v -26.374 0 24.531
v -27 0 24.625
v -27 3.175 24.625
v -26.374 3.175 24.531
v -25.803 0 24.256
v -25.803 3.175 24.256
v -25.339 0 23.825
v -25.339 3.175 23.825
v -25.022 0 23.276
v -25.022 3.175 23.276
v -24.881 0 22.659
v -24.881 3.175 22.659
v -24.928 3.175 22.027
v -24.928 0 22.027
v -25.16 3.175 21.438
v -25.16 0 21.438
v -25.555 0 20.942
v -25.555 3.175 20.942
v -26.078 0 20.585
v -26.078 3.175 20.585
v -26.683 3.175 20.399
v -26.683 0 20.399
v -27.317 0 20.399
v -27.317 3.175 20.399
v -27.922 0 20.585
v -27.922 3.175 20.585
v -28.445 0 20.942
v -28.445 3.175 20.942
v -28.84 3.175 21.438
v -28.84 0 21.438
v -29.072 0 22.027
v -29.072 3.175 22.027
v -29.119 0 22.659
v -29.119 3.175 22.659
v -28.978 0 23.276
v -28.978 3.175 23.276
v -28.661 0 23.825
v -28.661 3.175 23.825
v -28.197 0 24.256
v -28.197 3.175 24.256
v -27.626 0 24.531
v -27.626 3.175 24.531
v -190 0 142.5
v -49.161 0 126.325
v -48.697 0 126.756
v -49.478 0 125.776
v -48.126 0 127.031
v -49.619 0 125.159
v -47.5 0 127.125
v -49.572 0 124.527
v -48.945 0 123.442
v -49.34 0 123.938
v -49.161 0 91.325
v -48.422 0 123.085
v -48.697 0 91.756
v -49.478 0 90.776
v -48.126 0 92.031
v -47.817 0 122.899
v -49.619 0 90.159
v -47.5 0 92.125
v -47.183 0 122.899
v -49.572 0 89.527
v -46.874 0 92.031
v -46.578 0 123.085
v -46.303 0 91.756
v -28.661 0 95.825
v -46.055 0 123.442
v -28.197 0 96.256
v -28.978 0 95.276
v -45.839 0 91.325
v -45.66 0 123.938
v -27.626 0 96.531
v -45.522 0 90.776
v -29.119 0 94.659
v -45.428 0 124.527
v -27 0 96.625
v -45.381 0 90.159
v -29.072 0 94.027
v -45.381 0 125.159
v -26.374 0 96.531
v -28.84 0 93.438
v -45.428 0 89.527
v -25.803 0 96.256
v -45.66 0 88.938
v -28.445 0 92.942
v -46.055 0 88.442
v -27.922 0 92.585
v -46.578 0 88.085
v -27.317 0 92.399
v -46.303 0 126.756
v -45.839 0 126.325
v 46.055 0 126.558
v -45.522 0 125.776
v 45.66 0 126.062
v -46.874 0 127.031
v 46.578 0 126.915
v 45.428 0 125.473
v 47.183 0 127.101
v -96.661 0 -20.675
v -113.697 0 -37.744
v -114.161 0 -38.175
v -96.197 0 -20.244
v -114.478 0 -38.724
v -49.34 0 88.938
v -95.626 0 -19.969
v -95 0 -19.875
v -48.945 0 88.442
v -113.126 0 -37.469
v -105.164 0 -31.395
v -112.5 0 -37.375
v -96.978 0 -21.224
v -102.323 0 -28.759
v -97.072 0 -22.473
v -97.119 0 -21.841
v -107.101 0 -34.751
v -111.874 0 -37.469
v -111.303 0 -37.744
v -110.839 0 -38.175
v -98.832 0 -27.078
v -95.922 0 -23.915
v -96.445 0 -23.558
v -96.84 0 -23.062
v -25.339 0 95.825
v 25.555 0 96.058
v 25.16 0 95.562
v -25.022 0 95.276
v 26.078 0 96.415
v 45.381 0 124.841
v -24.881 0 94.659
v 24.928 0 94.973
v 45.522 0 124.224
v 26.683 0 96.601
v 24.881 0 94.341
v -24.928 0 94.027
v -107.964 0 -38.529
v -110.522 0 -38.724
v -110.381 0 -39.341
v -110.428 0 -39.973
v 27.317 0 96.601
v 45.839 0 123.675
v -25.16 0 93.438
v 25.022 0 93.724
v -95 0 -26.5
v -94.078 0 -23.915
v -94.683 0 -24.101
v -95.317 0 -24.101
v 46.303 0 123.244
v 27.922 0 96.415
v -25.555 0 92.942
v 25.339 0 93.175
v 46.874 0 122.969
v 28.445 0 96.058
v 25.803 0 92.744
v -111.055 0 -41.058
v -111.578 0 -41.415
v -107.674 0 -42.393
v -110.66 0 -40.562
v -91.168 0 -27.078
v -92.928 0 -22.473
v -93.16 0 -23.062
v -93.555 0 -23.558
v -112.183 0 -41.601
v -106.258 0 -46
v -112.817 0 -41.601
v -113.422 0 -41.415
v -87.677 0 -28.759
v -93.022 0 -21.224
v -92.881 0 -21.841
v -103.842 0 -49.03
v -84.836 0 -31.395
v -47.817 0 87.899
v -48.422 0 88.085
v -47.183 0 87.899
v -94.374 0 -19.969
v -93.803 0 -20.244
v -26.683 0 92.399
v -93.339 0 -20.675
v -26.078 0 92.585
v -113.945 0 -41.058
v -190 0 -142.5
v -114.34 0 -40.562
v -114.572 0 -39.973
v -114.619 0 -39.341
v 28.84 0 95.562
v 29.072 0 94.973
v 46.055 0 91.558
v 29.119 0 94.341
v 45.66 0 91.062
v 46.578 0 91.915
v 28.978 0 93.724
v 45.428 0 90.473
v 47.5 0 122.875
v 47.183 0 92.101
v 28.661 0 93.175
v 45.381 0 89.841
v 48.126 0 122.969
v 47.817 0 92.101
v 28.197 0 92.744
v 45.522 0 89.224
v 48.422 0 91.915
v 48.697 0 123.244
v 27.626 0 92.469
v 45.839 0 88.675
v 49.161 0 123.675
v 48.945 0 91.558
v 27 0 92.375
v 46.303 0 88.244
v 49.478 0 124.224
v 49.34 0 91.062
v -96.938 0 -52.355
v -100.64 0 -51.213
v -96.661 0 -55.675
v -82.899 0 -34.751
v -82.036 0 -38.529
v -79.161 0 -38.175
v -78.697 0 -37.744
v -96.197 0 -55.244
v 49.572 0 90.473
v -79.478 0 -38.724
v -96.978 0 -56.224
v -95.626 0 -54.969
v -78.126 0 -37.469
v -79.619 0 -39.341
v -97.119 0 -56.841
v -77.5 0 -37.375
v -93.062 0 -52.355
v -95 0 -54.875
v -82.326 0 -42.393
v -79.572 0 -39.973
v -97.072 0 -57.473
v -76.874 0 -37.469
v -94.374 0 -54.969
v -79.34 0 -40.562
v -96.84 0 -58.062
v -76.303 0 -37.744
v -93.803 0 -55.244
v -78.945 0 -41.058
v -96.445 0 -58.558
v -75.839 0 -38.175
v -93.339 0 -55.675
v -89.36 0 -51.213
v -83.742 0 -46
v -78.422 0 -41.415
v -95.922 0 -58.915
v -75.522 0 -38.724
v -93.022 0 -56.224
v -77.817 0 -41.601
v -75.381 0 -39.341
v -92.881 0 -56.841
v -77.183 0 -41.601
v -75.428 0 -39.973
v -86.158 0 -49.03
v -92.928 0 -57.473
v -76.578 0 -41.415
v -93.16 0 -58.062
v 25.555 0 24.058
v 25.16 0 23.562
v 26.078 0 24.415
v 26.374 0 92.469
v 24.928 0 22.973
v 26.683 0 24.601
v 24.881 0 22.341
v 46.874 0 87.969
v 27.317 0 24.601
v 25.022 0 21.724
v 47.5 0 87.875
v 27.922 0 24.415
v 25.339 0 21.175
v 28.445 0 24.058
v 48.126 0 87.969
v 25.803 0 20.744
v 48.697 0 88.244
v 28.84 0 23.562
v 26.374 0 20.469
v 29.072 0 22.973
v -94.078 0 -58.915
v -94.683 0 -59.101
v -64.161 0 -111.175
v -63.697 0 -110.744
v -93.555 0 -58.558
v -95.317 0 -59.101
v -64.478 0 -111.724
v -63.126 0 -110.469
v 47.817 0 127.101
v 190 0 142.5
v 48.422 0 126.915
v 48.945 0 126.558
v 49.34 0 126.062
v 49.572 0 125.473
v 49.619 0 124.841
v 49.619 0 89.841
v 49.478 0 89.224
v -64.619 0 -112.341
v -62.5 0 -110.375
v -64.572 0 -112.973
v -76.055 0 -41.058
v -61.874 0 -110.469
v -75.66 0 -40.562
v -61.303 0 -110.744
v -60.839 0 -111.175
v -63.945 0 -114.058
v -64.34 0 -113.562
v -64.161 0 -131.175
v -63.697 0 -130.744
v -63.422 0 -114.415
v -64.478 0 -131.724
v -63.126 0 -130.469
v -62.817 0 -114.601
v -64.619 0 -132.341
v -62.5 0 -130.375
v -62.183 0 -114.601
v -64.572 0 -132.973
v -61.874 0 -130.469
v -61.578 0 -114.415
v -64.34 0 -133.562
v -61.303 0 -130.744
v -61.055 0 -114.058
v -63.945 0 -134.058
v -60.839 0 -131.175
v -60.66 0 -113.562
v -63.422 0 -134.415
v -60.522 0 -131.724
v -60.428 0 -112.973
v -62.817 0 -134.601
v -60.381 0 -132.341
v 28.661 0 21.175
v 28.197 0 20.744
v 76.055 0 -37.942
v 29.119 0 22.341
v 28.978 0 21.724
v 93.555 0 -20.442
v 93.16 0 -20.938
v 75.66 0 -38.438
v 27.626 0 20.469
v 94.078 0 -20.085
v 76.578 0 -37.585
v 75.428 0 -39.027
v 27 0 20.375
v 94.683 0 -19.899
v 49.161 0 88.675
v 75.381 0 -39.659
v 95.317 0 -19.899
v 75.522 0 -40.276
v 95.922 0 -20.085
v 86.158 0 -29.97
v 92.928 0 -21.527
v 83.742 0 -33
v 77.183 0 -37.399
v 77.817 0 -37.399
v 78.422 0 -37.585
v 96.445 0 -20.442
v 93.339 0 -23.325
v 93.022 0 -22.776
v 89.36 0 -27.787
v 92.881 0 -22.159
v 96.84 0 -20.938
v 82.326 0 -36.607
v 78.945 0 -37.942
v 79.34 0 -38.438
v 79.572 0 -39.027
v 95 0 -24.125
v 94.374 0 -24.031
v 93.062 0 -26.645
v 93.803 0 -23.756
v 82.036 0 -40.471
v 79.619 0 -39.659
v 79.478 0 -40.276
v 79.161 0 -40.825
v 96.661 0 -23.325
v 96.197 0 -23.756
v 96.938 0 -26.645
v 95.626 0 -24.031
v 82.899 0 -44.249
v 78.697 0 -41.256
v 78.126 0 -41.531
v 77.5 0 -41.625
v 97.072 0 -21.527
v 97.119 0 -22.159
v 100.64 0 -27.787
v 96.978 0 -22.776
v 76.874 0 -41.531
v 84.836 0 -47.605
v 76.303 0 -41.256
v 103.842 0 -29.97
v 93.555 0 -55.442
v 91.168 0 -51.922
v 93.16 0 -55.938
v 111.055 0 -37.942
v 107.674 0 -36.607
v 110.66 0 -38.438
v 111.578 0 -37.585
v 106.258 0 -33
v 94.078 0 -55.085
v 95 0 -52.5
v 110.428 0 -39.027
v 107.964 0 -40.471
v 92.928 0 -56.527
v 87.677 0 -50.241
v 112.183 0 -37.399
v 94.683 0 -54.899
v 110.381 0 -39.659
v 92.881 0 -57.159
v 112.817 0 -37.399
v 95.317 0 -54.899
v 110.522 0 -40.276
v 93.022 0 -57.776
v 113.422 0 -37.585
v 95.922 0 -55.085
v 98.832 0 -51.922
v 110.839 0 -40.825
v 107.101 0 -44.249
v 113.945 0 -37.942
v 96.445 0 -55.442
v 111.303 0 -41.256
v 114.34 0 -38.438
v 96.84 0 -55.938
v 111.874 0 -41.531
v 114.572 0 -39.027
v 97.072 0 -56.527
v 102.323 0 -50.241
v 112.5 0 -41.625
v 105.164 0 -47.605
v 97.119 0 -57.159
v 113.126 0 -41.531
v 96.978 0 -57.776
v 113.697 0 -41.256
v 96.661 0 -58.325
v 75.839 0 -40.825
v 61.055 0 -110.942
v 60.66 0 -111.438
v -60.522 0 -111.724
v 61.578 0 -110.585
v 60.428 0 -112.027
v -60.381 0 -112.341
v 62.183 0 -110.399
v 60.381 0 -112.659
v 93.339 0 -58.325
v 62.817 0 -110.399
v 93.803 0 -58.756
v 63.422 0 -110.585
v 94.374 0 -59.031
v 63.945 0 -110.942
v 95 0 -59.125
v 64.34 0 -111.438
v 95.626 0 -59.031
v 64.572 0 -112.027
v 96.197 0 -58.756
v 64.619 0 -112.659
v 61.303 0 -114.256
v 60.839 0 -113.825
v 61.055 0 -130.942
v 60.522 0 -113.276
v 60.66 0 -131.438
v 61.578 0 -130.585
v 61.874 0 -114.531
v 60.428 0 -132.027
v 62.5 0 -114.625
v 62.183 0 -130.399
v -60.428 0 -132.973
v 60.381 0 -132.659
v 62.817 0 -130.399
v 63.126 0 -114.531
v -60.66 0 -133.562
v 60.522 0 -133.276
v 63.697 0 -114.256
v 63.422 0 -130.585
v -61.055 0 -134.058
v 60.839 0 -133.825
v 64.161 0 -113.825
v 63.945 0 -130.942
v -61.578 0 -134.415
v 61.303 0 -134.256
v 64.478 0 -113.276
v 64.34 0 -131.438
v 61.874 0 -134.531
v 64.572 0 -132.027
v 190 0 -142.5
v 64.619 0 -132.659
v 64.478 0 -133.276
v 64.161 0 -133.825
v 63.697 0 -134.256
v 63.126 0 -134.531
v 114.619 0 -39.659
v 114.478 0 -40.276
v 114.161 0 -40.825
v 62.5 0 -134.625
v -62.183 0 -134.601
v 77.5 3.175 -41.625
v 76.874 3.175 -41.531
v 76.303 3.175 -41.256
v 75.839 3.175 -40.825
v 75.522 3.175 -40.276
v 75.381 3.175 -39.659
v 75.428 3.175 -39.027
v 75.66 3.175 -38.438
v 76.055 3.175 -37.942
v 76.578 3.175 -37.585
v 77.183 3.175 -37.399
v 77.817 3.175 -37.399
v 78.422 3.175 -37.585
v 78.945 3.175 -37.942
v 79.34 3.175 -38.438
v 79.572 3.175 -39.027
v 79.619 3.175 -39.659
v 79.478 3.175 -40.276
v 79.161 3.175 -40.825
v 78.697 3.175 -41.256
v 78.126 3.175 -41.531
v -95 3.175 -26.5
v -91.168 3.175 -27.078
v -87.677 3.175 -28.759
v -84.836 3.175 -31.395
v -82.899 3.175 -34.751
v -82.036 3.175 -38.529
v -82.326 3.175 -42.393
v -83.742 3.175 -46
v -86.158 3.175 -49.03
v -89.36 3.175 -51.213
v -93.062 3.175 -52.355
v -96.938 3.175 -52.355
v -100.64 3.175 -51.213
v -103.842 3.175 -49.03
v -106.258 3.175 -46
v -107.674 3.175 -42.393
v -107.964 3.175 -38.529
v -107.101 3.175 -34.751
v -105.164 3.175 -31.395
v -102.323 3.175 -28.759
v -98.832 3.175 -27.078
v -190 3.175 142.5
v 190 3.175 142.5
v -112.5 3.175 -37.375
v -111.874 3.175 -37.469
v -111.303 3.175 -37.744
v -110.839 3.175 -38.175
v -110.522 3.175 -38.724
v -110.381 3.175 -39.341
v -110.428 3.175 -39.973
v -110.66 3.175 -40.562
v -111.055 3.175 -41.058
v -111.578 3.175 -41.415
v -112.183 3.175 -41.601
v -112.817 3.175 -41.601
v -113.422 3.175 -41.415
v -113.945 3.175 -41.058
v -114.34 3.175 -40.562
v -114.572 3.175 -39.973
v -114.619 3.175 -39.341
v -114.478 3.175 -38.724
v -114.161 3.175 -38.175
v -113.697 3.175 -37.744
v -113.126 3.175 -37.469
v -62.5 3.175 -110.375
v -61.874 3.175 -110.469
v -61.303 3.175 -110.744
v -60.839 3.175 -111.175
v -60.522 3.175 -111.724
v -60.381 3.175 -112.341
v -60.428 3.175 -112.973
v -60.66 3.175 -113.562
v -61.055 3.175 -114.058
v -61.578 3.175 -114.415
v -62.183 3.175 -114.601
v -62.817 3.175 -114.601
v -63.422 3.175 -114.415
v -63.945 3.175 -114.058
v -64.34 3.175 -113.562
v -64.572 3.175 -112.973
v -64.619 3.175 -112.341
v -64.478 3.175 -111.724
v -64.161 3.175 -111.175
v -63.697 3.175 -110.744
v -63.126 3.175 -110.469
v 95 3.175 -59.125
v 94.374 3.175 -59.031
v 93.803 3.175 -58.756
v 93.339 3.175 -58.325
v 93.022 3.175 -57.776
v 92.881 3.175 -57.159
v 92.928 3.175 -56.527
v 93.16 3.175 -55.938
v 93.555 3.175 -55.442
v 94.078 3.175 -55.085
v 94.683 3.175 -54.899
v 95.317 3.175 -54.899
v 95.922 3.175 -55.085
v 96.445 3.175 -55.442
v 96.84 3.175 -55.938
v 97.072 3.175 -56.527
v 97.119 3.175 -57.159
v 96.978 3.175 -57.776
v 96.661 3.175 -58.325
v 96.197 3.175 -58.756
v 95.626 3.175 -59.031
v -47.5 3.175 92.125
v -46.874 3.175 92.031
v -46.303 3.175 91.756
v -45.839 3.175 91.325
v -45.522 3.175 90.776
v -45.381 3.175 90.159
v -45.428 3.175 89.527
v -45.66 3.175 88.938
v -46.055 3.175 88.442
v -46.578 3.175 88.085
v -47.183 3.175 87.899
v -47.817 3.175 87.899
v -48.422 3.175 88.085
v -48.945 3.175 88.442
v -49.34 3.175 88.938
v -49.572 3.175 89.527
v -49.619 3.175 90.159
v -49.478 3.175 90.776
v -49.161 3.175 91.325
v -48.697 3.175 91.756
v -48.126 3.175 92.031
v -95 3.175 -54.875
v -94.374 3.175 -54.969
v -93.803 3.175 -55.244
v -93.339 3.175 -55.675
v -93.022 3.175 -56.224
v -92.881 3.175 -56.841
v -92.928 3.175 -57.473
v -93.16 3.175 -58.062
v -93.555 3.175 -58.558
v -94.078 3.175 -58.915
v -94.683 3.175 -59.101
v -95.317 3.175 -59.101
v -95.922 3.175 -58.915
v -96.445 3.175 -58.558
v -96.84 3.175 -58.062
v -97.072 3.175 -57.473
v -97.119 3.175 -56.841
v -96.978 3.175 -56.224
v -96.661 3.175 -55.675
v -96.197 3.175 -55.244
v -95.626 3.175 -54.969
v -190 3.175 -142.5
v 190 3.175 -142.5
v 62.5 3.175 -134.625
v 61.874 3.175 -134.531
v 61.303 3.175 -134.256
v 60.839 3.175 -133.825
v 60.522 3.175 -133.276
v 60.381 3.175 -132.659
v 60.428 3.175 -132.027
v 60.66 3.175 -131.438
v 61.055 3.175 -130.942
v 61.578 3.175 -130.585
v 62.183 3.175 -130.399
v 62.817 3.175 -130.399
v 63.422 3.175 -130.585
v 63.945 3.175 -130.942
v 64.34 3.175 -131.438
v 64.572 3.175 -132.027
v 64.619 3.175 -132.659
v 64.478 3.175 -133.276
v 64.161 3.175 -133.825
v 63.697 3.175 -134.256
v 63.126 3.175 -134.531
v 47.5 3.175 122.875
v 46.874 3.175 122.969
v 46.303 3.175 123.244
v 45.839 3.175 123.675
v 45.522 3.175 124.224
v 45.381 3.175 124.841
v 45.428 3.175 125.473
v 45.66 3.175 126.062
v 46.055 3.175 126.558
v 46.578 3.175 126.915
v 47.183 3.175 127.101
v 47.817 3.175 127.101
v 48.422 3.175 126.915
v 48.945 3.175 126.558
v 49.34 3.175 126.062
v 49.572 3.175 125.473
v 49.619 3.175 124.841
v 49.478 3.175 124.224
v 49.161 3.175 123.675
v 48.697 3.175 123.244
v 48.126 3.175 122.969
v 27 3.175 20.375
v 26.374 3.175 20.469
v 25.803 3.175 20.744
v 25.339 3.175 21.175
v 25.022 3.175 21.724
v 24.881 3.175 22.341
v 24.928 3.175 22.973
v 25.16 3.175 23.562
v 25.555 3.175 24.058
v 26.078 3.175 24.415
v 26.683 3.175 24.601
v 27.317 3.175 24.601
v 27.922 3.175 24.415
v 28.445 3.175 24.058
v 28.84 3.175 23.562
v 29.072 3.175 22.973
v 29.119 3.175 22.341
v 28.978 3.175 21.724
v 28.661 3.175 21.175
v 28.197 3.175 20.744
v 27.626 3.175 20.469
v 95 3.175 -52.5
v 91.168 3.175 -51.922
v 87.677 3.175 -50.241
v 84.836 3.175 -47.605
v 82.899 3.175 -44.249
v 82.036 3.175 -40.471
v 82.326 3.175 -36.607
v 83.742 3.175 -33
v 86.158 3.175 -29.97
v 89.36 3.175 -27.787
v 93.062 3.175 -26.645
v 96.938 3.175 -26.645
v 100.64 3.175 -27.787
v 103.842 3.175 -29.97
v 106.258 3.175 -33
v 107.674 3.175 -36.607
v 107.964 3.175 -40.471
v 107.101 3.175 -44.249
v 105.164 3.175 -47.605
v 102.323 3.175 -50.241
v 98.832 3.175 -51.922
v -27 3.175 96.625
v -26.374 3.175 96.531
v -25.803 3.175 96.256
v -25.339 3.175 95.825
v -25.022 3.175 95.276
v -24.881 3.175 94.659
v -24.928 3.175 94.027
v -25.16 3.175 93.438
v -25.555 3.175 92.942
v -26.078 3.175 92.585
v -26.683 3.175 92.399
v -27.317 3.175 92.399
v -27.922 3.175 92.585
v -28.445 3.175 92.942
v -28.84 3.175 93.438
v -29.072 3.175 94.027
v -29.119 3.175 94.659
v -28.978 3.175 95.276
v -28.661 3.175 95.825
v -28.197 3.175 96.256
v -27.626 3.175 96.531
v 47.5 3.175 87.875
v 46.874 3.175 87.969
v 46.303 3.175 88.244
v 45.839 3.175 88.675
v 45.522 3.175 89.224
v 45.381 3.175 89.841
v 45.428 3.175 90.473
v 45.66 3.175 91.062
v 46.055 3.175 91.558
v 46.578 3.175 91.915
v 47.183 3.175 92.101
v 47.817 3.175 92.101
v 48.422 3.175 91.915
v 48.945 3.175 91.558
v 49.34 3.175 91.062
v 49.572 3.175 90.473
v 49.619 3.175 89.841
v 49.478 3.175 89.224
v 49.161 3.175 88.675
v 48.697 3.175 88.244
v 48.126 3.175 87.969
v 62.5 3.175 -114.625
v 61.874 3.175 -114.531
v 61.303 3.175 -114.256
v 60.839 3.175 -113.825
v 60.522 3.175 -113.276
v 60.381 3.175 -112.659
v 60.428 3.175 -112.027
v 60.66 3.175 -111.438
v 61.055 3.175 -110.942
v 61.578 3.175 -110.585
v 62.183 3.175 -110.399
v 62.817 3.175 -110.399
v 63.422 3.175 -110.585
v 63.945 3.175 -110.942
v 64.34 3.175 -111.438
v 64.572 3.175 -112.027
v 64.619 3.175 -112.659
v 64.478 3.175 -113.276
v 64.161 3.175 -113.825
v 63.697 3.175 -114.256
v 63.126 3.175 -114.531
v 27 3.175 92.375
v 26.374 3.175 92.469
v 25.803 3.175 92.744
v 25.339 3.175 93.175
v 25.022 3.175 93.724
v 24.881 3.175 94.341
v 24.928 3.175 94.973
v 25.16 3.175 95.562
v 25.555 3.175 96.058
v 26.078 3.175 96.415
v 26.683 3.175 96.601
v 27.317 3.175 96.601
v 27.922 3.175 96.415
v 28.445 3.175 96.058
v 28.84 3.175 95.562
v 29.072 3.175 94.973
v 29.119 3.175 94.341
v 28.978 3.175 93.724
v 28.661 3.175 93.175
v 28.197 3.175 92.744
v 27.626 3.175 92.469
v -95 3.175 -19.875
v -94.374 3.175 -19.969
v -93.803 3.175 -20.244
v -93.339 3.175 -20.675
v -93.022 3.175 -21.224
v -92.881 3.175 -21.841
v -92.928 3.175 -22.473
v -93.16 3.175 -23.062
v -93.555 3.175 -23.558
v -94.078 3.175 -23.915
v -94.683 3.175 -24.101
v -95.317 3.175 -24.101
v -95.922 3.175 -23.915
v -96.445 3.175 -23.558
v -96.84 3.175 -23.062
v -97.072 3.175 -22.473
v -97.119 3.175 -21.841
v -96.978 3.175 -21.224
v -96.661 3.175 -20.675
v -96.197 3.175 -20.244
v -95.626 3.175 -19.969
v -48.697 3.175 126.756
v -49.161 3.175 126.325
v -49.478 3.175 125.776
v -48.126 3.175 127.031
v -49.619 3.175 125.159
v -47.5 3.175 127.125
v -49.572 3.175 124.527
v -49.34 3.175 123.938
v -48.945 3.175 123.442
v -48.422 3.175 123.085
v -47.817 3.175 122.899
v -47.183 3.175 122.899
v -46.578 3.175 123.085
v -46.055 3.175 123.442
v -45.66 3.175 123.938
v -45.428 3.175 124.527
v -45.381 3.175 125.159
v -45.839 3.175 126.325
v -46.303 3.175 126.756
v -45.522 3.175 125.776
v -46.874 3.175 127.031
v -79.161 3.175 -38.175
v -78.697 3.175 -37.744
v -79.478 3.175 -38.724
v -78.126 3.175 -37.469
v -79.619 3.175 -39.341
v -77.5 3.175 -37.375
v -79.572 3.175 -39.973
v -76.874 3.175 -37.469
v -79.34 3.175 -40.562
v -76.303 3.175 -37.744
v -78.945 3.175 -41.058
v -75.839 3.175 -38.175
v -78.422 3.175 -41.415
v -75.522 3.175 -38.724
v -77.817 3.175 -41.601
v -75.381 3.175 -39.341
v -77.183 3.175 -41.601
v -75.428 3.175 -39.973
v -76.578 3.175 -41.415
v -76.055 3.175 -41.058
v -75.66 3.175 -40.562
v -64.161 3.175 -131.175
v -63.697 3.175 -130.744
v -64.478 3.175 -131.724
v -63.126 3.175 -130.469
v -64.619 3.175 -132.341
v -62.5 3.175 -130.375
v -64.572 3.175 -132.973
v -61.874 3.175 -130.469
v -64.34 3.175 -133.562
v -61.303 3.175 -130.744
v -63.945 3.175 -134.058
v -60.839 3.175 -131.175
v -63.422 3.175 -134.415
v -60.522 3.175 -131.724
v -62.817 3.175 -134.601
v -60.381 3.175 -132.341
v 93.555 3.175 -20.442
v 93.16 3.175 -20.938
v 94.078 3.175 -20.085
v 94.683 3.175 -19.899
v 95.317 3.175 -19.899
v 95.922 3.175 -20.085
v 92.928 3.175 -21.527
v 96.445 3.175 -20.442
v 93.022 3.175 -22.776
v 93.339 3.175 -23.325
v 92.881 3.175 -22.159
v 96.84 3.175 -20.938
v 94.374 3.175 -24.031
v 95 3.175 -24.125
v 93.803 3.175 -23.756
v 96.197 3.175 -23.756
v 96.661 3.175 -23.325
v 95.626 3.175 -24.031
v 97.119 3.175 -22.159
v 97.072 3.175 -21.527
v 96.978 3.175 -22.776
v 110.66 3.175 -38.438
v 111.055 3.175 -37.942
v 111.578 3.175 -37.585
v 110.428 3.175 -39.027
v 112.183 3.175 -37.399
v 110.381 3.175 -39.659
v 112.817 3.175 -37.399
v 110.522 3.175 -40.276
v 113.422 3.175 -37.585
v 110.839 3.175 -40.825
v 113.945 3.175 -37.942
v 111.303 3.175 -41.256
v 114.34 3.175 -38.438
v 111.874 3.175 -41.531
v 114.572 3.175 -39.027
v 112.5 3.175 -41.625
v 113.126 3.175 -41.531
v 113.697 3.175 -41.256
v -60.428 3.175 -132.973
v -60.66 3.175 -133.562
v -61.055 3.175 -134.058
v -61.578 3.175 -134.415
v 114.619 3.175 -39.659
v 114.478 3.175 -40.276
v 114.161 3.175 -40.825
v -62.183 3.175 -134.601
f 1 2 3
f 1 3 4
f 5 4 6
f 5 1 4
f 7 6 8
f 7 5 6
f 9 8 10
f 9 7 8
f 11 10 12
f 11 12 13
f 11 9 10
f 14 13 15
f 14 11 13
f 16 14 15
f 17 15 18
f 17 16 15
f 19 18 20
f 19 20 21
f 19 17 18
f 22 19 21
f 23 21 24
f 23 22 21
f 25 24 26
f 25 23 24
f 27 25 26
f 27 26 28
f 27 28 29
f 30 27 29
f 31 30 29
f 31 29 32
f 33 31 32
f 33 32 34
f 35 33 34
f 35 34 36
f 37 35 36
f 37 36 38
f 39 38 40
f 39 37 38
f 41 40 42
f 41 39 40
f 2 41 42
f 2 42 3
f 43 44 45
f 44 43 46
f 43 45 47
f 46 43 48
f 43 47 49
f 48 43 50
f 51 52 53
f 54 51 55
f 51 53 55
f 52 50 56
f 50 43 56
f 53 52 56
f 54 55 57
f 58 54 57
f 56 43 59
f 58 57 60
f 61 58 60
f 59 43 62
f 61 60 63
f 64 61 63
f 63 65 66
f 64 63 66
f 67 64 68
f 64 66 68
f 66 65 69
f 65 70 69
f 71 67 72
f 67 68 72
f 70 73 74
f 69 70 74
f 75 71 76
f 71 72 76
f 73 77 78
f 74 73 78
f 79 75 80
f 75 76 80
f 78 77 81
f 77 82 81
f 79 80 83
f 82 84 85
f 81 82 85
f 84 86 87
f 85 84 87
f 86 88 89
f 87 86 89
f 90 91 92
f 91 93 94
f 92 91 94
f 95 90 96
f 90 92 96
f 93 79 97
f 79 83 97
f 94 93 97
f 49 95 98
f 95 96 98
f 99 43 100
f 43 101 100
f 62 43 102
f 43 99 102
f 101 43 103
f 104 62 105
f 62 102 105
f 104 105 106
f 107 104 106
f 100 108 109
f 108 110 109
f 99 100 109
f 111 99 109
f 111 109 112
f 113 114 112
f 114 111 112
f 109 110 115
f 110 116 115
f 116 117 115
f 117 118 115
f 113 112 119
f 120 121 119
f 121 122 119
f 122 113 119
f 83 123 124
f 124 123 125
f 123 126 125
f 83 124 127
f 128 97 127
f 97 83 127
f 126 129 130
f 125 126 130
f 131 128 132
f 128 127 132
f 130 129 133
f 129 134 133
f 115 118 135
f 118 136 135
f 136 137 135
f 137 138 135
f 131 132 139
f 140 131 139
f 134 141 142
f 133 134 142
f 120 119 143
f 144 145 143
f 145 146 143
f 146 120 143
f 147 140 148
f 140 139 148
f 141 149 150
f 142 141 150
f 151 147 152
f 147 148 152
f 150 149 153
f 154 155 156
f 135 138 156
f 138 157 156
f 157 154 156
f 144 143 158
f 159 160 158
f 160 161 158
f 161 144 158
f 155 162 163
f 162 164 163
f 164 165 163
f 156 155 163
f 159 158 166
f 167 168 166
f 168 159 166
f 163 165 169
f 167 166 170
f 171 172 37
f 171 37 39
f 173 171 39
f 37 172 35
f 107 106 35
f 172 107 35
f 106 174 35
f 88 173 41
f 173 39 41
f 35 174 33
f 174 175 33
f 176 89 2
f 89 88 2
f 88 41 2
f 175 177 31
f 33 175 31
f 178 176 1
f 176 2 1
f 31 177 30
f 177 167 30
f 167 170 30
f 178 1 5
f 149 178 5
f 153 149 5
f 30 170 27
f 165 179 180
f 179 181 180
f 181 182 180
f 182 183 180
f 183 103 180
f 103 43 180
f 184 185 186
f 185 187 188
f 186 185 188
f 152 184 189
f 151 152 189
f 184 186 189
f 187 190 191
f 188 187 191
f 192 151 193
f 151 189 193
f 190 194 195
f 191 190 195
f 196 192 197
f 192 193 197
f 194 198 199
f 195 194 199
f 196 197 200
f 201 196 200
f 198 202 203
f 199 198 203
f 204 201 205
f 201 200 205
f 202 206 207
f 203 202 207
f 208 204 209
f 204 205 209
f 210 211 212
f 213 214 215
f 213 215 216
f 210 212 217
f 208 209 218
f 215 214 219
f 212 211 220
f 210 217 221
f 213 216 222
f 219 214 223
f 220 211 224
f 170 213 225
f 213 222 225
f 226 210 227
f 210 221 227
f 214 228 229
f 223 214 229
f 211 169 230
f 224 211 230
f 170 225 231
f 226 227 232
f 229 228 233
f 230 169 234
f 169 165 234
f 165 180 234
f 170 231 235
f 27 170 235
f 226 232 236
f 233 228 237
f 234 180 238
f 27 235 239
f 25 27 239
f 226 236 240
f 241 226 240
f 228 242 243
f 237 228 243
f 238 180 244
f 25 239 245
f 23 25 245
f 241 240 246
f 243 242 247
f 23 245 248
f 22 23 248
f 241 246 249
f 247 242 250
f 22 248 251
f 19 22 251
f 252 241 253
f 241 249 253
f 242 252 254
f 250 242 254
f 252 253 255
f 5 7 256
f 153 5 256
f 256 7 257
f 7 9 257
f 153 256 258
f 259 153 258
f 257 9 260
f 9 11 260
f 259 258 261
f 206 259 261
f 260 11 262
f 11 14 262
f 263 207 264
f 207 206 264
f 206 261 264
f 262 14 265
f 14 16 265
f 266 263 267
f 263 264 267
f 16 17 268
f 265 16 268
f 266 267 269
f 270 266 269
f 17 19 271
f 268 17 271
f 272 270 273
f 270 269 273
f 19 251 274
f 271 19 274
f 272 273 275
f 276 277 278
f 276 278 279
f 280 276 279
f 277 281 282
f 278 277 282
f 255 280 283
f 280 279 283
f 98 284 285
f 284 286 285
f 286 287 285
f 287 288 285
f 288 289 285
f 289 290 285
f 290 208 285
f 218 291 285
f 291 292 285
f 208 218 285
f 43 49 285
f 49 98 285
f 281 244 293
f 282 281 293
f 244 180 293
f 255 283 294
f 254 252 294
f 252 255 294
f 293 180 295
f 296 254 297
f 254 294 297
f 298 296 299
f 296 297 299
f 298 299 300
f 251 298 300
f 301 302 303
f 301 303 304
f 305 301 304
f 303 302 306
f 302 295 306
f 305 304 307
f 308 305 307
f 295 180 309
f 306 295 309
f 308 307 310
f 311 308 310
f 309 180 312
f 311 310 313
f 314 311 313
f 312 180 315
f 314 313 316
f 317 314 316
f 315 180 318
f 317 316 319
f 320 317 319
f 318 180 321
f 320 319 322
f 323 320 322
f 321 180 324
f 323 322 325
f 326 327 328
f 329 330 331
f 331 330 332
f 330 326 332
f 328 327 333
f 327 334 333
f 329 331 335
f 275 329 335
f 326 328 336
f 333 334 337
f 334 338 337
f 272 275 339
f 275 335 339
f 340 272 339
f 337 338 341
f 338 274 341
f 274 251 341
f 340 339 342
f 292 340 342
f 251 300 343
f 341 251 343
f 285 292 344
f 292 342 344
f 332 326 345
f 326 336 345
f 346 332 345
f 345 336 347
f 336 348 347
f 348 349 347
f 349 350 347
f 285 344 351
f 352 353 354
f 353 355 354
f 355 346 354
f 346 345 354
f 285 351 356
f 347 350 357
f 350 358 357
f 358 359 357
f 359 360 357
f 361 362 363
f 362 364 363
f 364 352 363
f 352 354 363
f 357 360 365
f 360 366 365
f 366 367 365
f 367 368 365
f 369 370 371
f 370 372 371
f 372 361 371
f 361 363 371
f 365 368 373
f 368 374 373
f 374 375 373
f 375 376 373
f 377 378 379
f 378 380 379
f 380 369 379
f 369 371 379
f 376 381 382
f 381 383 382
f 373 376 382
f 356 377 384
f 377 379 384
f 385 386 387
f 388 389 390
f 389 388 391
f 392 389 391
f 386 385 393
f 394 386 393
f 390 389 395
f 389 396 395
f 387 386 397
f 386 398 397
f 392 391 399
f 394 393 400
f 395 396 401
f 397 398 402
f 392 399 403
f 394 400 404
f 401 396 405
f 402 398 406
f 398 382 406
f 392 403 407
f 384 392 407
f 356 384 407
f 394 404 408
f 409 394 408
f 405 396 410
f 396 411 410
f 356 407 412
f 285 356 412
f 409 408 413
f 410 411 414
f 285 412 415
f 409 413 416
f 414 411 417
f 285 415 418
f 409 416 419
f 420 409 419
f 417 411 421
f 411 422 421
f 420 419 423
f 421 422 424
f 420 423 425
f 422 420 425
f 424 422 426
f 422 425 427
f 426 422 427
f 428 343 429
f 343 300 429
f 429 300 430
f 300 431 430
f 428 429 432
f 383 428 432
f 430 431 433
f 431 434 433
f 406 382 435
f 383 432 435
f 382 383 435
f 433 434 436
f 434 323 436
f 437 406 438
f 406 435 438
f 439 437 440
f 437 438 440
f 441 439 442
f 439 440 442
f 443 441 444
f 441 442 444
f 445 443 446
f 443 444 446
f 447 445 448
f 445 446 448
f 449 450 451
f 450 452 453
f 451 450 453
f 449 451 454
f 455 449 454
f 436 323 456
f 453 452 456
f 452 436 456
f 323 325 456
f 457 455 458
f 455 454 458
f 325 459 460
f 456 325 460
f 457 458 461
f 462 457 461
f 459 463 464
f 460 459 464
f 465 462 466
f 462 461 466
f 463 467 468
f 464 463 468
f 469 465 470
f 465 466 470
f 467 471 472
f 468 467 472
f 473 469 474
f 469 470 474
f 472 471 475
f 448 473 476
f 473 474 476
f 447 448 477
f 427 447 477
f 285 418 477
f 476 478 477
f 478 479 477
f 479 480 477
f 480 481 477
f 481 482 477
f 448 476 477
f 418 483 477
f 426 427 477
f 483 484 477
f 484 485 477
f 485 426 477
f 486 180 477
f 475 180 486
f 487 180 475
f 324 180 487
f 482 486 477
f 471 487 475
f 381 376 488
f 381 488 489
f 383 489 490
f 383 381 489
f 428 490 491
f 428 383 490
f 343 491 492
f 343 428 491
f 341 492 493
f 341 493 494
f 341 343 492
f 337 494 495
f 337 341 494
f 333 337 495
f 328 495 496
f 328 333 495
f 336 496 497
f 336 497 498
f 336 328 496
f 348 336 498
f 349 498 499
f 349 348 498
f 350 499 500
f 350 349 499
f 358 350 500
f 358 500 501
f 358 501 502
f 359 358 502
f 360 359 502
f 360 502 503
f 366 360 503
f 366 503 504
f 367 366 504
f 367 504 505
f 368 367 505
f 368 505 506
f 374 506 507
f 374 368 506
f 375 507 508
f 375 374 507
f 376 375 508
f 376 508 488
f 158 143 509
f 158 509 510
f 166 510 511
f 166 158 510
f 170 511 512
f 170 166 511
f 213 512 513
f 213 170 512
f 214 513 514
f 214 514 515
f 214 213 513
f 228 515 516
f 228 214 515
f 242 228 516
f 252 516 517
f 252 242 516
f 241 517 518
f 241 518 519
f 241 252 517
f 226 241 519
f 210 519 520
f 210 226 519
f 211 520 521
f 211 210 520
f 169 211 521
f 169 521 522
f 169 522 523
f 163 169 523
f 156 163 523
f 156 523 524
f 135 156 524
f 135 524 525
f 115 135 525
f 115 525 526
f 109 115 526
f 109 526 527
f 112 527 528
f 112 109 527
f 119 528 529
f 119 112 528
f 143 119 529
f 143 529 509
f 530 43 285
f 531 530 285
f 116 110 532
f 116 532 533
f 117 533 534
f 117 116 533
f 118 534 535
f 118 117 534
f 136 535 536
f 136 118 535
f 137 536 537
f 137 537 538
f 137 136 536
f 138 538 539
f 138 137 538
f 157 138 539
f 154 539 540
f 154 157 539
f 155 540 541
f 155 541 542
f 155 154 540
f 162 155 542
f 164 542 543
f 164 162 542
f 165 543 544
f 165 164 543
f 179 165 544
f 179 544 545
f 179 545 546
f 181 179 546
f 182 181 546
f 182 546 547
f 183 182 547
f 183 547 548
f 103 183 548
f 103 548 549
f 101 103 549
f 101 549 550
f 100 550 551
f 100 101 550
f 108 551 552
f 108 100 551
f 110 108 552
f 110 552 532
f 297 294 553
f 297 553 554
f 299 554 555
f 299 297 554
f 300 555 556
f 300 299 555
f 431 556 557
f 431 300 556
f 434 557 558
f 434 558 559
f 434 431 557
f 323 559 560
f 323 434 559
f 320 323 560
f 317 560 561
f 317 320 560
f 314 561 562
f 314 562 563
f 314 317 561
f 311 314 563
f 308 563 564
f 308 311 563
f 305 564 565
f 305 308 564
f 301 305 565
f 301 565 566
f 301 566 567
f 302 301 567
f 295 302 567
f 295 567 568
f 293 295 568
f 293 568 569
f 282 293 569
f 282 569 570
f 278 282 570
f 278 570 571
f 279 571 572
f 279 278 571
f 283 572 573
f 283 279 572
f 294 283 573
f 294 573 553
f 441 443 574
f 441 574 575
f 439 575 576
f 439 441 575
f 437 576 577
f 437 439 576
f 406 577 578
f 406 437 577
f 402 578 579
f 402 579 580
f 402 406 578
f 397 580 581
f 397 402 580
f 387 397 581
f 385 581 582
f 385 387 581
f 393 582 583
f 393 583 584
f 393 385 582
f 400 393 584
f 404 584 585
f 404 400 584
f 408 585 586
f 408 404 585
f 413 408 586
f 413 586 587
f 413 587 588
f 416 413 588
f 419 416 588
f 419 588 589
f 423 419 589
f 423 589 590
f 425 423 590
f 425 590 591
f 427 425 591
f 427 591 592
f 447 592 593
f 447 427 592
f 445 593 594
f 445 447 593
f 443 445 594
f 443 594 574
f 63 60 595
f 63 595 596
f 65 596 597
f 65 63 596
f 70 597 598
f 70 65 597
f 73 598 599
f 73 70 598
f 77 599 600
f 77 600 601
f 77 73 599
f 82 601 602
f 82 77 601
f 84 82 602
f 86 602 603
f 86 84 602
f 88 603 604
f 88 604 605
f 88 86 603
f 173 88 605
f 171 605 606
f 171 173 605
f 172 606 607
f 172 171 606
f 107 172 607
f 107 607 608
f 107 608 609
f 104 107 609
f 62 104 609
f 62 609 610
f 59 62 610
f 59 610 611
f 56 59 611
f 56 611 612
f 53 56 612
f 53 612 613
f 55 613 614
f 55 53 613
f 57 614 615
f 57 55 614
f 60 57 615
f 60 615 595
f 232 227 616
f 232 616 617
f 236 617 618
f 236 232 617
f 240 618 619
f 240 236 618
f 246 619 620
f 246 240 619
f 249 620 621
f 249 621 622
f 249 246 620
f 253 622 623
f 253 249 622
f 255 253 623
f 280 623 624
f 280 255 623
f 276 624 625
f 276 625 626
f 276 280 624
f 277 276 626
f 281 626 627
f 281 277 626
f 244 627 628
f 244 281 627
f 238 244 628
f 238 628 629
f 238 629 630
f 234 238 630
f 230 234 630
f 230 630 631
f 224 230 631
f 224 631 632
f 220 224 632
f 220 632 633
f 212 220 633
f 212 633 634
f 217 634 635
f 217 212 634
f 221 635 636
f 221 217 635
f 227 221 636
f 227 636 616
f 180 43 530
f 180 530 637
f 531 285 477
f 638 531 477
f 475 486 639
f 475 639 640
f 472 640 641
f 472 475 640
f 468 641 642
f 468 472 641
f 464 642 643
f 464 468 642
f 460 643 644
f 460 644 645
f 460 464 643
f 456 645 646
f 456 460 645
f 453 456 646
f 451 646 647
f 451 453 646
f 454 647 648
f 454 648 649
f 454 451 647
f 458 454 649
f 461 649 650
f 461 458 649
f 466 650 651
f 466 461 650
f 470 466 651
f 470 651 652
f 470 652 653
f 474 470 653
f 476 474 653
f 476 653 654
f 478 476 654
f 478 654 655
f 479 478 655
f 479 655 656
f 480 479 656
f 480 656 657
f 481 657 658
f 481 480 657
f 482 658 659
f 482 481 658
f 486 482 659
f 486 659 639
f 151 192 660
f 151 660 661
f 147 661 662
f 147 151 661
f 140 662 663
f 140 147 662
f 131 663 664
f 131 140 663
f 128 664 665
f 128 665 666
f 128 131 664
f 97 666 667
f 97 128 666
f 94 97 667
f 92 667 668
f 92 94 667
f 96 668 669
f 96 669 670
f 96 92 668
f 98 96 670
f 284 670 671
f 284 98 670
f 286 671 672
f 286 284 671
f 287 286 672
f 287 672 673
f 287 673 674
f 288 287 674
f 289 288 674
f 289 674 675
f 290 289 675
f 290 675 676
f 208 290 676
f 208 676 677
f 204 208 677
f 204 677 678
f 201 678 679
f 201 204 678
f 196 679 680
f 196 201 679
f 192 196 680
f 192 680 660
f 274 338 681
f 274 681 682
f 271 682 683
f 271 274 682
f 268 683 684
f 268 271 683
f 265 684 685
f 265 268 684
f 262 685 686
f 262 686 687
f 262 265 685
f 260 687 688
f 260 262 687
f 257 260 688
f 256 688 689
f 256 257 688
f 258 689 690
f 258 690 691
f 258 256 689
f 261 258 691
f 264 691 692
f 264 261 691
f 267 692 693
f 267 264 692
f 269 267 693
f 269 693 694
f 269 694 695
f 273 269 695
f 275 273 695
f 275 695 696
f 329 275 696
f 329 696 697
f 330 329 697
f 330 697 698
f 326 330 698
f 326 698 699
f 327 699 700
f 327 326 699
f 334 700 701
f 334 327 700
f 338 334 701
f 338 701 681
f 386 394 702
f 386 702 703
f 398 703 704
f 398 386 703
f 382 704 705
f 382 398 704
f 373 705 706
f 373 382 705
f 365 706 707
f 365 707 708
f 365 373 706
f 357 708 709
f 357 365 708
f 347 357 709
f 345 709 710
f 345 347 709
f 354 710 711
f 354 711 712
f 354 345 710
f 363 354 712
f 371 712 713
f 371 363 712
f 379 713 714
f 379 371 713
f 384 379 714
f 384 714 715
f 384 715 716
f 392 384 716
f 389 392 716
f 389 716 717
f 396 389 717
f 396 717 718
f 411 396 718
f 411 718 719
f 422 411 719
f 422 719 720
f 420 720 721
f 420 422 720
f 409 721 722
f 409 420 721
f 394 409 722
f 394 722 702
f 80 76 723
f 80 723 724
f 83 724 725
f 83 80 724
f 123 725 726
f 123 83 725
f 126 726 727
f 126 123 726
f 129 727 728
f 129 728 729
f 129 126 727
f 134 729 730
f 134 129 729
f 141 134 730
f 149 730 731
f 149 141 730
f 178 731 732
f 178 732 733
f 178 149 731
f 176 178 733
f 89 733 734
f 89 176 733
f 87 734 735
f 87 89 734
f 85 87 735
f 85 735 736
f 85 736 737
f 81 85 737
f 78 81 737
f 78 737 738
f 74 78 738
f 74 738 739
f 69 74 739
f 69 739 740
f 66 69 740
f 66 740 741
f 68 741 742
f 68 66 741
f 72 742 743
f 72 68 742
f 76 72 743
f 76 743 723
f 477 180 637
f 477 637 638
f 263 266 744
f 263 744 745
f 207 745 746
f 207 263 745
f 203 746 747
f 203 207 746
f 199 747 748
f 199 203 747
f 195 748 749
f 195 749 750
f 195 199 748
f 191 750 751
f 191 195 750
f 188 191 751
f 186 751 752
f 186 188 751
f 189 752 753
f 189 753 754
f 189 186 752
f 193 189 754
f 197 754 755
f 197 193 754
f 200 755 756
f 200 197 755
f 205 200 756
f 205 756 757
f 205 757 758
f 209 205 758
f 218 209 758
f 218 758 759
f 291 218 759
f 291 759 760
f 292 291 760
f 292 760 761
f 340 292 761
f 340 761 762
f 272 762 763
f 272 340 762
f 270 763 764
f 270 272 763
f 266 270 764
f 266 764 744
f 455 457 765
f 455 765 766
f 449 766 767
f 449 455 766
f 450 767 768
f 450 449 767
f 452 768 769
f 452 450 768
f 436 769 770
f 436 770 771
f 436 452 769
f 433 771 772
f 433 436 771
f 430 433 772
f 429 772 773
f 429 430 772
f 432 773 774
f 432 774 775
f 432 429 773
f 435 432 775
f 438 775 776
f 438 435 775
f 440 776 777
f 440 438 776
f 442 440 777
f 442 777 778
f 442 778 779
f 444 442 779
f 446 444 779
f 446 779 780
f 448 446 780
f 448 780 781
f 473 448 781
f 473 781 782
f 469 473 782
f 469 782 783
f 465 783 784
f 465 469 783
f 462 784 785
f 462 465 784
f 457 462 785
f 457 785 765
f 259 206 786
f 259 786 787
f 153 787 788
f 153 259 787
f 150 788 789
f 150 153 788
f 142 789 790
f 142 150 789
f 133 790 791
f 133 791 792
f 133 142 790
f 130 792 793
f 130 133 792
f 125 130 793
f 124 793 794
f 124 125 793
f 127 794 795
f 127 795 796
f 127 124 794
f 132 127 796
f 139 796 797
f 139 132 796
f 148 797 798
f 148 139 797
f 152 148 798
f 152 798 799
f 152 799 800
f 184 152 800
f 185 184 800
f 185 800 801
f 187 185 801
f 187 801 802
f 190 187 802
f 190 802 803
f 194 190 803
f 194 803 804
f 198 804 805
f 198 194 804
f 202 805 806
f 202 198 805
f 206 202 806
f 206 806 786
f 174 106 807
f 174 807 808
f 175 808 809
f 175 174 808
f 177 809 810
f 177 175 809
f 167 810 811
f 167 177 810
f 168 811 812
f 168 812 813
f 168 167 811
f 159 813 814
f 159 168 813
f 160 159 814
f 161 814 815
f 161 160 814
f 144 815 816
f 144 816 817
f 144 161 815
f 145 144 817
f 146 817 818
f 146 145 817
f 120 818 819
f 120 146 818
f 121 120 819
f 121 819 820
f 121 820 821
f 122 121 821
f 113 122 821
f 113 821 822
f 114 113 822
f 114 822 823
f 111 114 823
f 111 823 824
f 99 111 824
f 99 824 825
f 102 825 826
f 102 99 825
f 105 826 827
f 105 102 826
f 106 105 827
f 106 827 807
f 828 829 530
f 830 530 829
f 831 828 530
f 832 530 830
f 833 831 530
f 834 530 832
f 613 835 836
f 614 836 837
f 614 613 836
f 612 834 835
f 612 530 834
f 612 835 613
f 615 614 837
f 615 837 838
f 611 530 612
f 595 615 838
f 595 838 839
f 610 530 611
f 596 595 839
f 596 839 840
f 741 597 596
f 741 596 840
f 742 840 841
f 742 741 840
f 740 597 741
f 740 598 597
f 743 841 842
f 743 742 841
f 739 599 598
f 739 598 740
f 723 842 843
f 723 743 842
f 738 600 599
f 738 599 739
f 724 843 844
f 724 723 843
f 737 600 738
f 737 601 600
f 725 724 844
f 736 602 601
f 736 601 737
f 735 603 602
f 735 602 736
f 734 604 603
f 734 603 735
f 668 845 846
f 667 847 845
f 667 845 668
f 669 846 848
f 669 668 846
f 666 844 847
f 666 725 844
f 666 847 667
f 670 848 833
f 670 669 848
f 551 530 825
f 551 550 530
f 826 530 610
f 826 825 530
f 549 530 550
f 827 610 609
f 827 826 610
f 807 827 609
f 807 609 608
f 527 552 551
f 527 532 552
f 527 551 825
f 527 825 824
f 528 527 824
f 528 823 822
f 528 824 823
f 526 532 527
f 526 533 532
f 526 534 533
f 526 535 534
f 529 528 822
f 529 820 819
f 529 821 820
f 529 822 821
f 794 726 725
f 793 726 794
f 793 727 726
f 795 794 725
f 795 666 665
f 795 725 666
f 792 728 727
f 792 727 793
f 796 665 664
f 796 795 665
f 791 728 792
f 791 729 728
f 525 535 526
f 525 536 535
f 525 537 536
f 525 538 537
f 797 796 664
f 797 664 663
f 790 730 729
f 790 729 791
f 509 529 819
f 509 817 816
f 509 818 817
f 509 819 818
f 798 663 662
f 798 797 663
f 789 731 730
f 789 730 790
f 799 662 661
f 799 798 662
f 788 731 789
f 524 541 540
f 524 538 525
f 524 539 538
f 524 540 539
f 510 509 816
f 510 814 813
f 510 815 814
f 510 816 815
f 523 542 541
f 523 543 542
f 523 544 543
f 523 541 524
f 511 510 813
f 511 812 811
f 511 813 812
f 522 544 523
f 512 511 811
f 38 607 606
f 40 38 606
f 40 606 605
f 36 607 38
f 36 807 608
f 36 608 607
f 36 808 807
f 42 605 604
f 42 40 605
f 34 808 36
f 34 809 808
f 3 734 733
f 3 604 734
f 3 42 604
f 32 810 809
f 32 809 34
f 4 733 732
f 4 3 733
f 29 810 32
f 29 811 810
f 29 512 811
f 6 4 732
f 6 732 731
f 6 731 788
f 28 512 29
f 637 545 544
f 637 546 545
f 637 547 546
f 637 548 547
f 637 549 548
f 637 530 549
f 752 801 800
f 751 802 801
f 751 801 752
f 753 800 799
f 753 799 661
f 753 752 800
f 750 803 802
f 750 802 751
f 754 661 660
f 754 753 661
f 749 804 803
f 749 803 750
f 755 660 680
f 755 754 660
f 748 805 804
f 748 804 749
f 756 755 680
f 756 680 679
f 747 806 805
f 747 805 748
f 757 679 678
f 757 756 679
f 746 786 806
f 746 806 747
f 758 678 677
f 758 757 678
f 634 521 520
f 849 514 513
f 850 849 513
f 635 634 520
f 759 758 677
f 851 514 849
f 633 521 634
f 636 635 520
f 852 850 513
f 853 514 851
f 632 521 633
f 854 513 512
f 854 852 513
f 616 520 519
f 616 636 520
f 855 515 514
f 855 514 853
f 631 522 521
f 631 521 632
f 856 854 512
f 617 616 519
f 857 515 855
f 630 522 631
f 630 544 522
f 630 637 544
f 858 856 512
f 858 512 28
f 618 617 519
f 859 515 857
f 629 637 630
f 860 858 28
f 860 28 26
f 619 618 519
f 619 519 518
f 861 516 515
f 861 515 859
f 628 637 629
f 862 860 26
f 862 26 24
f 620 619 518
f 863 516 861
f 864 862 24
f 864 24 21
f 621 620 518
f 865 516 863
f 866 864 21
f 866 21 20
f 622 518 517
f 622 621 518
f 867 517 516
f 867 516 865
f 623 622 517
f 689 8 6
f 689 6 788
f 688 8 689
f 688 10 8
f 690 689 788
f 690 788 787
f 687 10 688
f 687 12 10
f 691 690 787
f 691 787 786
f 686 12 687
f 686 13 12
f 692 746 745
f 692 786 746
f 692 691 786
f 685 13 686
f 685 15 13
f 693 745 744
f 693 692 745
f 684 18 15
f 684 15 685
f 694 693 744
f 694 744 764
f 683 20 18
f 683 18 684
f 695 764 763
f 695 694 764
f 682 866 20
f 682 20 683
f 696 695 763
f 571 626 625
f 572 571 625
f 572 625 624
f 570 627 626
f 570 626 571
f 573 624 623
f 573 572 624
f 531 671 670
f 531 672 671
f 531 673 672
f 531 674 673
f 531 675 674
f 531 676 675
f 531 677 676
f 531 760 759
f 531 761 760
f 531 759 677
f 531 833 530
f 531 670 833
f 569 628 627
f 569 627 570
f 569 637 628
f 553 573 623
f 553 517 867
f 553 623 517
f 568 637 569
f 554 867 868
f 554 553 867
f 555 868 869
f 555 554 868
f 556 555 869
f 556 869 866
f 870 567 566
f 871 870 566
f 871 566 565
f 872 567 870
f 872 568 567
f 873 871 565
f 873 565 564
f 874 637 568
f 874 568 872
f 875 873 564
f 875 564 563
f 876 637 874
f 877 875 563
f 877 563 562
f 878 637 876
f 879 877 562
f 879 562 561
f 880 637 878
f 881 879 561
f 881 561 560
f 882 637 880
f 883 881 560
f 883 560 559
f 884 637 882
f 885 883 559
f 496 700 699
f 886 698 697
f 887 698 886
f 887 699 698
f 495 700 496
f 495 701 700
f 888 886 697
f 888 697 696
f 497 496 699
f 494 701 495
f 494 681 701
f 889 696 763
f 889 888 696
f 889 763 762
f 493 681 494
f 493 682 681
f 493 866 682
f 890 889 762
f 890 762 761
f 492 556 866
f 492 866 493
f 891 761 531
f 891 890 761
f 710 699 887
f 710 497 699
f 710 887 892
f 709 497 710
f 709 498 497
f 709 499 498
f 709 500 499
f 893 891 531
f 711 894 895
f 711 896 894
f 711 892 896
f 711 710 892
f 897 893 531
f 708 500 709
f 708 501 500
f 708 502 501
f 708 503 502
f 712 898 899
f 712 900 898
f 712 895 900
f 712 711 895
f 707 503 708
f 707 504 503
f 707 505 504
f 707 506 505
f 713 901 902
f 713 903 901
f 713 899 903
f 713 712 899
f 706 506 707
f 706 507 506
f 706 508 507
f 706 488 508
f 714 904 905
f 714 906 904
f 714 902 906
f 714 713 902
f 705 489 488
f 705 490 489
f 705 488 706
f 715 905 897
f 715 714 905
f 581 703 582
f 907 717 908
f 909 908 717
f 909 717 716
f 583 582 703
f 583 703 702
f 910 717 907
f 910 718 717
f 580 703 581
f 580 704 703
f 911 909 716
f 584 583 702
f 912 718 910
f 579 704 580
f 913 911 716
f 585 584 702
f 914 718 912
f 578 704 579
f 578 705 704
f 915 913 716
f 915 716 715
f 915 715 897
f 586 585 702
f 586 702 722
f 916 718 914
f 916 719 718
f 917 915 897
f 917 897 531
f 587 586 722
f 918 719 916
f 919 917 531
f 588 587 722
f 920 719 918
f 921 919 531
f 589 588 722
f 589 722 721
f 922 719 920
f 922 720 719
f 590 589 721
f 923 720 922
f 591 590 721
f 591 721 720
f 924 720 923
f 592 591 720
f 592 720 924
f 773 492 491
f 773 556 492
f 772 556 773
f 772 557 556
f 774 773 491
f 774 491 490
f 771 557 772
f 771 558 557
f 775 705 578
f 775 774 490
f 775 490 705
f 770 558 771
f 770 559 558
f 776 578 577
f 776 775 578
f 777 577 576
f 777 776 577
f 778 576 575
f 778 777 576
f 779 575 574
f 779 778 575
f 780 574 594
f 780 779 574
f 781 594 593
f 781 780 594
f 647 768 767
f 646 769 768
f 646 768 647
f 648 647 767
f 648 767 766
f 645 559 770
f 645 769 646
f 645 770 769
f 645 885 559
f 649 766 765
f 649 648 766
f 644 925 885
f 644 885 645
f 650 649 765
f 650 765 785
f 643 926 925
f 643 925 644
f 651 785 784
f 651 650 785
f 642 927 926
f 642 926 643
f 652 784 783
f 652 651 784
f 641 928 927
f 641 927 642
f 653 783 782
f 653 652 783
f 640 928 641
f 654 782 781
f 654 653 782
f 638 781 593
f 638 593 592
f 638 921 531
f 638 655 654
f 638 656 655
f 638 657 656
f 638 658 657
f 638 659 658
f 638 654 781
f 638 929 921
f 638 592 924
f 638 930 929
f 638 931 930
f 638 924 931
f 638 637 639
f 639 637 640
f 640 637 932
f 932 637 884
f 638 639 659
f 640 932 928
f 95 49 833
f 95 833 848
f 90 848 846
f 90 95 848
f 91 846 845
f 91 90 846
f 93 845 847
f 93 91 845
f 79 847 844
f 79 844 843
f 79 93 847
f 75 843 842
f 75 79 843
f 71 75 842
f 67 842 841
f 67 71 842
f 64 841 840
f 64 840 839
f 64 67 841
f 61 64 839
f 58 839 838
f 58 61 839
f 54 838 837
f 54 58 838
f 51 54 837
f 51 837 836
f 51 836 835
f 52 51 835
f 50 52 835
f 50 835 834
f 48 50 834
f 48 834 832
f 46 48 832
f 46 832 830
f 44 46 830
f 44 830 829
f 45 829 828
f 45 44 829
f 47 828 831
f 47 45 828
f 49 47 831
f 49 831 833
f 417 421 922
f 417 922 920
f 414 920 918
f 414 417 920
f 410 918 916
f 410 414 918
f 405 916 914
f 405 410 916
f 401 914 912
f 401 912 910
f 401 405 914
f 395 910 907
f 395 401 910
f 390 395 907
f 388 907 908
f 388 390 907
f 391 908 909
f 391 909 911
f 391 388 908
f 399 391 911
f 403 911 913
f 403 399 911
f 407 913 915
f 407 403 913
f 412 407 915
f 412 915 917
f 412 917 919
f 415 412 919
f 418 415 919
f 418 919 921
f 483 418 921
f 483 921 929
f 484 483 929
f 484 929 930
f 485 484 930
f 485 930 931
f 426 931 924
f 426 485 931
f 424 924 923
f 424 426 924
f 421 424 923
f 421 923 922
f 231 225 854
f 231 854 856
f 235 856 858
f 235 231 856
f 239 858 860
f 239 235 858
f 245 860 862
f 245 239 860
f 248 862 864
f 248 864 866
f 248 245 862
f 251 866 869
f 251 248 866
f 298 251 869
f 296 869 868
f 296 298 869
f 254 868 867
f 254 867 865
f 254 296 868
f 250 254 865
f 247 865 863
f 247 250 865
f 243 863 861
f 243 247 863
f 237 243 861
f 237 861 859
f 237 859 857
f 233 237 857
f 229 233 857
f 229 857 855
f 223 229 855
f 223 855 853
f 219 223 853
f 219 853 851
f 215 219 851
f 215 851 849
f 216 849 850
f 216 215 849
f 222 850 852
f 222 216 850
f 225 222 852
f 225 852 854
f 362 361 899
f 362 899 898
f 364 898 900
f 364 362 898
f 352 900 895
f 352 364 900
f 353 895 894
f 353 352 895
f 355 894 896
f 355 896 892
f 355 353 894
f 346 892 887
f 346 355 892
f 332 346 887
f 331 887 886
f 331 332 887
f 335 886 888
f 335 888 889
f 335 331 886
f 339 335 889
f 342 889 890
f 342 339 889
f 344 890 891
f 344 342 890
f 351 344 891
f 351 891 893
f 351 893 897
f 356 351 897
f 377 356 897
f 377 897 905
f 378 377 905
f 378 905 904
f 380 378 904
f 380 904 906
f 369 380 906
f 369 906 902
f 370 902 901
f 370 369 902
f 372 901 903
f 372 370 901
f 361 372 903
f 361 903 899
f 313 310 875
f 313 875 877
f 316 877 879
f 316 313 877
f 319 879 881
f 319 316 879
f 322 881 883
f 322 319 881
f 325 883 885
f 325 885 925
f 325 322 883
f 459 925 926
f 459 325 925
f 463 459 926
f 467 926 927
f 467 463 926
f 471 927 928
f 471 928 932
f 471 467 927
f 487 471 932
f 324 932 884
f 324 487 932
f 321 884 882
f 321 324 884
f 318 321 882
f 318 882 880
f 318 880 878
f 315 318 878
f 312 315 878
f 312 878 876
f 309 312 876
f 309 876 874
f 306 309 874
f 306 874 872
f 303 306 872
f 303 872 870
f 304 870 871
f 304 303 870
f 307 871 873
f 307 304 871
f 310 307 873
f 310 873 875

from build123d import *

# Parameters (mm, degrees)
SKETCH1_W           = 380
SKETCH1_H           = 285
SKETCH1_R           = 13
SKETCH1_R_2         = 2.125
BOSS_EXTRUDE1_DEPTH = 3.175


with BuildPart() as part:
    # Sketch1 → Boss-Extrude1 (new body)
    with BuildSketch(Plane(origin=(0, 0, 0), x_dir=(1, 0, 0), z_dir=(0, 1, 0))):
        Rectangle(SKETCH1_W, SKETCH1_H)
        with Locations(Location((-95, 39.5, 0), (0, 0, 270))):
            Circle(SKETCH1_R, mode=Mode.SUBTRACT)
        with Locations(Location((-112.5, 39.5, 0), (0, 0, 270))):
            Circle(SKETCH1_R_2, mode=Mode.SUBTRACT)
        with Locations(Location((-47.5, -125, 0), (0, 0, 270))):
            Circle(SKETCH1_R_2, mode=Mode.SUBTRACT)
        with Locations(Location((-47.5, -90, 0), (0, 0, 270))):
            Circle(SKETCH1_R_2, mode=Mode.SUBTRACT)
        with Locations(Location((-95, 57, 0), (0, 0, 270))):
            Circle(SKETCH1_R_2, mode=Mode.SUBTRACT)
        with Locations(Location((-77.5, 39.5, 0), (0, 0, 270))):
            Circle(SKETCH1_R_2, mode=Mode.SUBTRACT)
        with Locations(Location((-95, 22, 0), (0, 0, 270))):
            Circle(SKETCH1_R_2, mode=Mode.SUBTRACT)
        with Locations(Location((-62.5, 132.5, 0), (0, 0, 270))):
            Circle(SKETCH1_R_2, mode=Mode.SUBTRACT)
        with Locations(Location((-62.5, 112.5, 0), (0, 0, 270))):
            Circle(SKETCH1_R_2, mode=Mode.SUBTRACT)
        with Locations(Location((47.5, -90, 0), (0, 0, 90))):
            Circle(SKETCH1_R_2, mode=Mode.SUBTRACT)
        with Locations(Location((47.5, -125, 0), (0, 0, 90))):
            Circle(SKETCH1_R_2, mode=Mode.SUBTRACT)
        with Locations(Location((95, 22, 0), (0, 0, 90))):
            Circle(SKETCH1_R_2, mode=Mode.SUBTRACT)
        with Locations(Location((77.5, 39.5, 0), (0, 0, 90))):
            Circle(SKETCH1_R_2, mode=Mode.SUBTRACT)
        with Locations(Location((112.5, 39.5, 0), (0, 0, 90))):
            Circle(SKETCH1_R_2, mode=Mode.SUBTRACT)
        with Locations(Location((95, 57, 0), (0, 0, 90))):
            Circle(SKETCH1_R_2, mode=Mode.SUBTRACT)
        with Locations(Location((95, 39.5, 0), (0, 0, 90))):
            Circle(SKETCH1_R, mode=Mode.SUBTRACT)
        with Locations(Location((62.5, 112.5, 0), (0, 0, 90))):
            Circle(SKETCH1_R_2, mode=Mode.SUBTRACT)
        with Locations(Location((62.5, 132.5, 0), (0, 0, 90))):
            Circle(SKETCH1_R_2, mode=Mode.SUBTRACT)
        with Locations(Location((-27, -94.5, 0), (0, 0, 270))):
            Circle(SKETCH1_R_2, mode=Mode.SUBTRACT)
        with Locations(Location((-27, -22.5, 0), (0, 0, 270))):
            Circle(SKETCH1_R_2, mode=Mode.SUBTRACT)
        with Locations(Location((27, -94.5, 0), (0, 0, 90))):
            Circle(SKETCH1_R_2, mode=Mode.SUBTRACT)
        with Locations(Location((27, -22.5, 0), (0, 0, 90))):
            Circle(SKETCH1_R_2, mode=Mode.SUBTRACT)
    extrude(amount=BOSS_EXTRUDE1_DEPTH)


solid = part.part
